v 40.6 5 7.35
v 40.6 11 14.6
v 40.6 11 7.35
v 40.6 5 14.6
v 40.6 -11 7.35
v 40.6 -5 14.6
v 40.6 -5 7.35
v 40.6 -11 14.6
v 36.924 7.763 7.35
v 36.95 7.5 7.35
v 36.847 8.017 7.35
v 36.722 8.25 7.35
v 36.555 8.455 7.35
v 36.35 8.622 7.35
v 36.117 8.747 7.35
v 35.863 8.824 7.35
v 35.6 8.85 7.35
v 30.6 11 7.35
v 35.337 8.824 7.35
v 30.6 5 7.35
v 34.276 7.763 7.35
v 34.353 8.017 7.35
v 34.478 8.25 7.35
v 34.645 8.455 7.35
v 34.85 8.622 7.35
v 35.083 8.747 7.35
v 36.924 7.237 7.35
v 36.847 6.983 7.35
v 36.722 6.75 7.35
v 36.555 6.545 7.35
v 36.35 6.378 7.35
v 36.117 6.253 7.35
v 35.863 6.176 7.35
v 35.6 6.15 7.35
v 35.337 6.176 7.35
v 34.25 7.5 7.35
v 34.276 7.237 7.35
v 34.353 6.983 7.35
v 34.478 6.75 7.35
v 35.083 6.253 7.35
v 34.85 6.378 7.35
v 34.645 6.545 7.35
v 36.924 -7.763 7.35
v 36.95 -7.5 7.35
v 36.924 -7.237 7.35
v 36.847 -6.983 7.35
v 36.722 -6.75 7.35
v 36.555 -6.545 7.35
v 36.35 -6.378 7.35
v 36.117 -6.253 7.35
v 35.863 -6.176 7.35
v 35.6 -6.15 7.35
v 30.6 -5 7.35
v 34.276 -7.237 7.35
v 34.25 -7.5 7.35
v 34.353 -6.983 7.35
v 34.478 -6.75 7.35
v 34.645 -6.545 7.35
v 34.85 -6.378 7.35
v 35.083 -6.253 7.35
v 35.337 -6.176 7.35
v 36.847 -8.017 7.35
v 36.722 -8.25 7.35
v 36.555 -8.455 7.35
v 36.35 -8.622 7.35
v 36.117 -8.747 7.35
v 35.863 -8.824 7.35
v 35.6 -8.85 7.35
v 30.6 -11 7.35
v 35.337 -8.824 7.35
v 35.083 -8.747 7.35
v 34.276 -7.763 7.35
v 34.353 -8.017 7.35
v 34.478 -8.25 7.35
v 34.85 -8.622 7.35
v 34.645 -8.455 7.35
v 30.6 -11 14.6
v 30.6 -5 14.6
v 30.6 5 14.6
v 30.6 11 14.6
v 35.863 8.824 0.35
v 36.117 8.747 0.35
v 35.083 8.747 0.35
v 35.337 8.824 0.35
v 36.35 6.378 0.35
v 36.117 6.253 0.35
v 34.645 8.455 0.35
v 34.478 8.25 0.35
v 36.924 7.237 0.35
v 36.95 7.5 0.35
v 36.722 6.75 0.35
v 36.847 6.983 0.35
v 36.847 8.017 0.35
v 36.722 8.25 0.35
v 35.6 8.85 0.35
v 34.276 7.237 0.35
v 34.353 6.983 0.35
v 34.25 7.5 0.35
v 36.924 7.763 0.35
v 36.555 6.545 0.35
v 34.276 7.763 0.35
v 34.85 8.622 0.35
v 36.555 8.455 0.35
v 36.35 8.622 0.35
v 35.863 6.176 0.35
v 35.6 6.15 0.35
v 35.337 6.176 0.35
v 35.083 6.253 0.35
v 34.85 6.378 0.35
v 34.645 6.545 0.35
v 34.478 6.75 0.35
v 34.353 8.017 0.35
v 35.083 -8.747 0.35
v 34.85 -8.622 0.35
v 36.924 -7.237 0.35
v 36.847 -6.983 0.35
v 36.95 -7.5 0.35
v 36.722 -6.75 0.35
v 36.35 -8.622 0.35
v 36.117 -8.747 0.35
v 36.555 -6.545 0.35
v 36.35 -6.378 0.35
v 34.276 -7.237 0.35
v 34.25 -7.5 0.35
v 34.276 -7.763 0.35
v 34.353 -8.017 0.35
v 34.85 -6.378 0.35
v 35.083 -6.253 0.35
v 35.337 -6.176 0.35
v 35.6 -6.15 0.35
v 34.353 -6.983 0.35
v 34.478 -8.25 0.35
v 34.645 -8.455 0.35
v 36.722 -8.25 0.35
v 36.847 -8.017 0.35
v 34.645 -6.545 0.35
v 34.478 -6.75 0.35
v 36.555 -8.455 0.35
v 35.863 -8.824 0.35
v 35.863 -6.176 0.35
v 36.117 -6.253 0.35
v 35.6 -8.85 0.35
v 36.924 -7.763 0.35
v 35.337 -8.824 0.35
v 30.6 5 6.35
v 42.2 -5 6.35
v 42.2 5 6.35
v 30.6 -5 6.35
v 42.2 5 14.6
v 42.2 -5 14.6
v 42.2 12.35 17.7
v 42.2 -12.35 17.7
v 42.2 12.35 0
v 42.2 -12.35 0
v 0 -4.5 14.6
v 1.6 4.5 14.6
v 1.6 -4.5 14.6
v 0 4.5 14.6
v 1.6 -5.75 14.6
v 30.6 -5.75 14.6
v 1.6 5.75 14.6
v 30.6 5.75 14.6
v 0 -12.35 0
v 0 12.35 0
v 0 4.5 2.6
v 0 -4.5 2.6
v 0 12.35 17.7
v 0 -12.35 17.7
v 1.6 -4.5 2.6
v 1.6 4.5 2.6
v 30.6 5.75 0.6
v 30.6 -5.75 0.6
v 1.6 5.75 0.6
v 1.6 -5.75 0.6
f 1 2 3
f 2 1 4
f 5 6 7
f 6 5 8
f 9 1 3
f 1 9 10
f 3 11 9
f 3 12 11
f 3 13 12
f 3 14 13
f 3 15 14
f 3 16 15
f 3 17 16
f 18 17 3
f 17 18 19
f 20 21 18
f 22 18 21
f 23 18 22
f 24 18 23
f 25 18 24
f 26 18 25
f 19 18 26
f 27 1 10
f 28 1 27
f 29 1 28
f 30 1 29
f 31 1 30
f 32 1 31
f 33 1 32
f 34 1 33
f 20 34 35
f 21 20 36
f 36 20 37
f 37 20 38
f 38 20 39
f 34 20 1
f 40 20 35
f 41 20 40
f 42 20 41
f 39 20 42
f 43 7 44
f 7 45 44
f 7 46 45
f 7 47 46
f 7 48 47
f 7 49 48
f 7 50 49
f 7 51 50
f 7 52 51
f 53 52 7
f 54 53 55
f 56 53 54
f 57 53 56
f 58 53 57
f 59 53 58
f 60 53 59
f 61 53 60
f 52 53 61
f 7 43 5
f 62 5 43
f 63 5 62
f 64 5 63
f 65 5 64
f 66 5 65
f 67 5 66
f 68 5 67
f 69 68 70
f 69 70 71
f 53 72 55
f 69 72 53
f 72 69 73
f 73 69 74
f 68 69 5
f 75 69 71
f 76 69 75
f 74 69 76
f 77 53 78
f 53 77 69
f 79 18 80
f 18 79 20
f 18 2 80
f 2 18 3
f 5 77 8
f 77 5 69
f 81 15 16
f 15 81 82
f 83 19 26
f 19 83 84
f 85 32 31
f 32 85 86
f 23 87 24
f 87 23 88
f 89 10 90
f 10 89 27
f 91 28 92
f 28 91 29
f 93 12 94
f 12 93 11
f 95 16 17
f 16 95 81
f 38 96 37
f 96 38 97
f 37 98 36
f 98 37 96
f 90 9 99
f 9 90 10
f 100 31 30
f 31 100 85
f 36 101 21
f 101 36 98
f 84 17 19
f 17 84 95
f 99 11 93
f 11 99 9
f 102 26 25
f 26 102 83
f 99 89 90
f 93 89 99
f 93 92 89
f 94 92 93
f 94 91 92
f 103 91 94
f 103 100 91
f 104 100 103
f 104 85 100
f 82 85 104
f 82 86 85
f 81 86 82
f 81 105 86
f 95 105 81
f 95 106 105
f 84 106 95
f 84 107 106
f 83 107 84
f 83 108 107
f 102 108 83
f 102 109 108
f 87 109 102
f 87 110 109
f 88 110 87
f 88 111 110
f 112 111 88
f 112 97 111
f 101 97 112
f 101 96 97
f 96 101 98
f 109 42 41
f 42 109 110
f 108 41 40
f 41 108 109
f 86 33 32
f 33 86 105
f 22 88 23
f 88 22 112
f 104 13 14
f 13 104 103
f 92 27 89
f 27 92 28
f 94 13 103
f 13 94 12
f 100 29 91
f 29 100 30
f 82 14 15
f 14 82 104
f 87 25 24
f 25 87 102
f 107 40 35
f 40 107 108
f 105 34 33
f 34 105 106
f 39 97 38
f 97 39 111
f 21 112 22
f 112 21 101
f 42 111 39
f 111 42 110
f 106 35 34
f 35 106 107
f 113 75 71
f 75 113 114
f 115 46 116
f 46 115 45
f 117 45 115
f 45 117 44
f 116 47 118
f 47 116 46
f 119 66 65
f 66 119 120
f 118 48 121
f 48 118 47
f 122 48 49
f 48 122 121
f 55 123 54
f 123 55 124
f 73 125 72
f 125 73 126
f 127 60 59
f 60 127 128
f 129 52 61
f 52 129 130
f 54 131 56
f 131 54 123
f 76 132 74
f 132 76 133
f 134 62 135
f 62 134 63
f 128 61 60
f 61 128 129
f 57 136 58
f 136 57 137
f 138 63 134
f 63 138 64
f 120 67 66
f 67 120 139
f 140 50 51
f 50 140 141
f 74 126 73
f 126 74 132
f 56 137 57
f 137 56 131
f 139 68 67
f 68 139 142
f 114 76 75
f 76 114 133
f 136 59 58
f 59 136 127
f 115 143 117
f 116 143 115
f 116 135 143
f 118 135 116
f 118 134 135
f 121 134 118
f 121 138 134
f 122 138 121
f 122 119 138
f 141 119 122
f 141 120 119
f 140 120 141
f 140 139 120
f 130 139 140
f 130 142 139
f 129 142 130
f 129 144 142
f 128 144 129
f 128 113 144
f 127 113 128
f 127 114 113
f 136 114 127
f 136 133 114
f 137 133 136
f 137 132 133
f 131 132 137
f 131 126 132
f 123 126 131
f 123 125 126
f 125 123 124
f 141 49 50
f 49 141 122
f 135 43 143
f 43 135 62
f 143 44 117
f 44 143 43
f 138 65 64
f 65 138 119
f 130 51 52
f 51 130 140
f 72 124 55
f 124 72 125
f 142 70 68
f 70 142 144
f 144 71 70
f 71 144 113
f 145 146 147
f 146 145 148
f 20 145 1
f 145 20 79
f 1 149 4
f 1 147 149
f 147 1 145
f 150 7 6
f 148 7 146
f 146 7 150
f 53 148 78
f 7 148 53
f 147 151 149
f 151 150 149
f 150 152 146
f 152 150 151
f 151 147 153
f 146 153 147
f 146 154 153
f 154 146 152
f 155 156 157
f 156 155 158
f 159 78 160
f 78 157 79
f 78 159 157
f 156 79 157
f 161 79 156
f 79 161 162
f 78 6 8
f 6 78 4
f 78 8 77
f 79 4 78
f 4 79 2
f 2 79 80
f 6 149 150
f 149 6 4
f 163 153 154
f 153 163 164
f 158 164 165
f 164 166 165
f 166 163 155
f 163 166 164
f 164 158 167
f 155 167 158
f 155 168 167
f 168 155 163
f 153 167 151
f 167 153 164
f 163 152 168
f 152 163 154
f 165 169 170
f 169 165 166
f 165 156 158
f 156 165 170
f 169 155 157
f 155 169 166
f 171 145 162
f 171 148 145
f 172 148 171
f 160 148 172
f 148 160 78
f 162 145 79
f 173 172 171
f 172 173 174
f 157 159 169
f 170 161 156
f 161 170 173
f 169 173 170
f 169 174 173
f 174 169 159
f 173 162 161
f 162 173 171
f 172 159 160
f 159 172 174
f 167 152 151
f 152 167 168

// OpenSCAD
BOARD_DEPTH = 11.5;
BOARD_HEIGHT = 14;
BOARD_WIDTH = 29;

INSERT_HEAD_HEIGHT = 2.5;
INSERT_HEAD_DIAMETER = 5;
INSERT_DIAMETER = 2.7;
INSERT_HEIGHT = 7;

USB_Y_OFFSET = 2;
USB_WIDTH = 9;

USB_FRONT_BLOCK_HEIGHT = 6.25;

CABLE_HEIGHT = 1;
CABLE_WIDTH = 10;
CABLE_STICKOUT = 10;
CABLE_Y_OFFSET = 5.75;

CABLE_REAR_BLOCK_HEIGHT = 5.25;

cable_strap_width = CABLE_WIDTH + INSERT_HEAD_DIAMETER * 2 + 2;
cable_strap_hole_offset_y = CABLE_WIDTH / 2 + INSERT_HEAD_DIAMETER / 2;

WALL_WIDTH = 1.6;
FLOOR_HEIGHT = .6;

render_helper = 1;

total_height = FLOOR_HEIGHT + BOARD_HEIGHT;
total_width = WALL_WIDTH * 2 + BOARD_WIDTH + CABLE_STICKOUT;
total_depth = WALL_WIDTH * 2 + BOARD_DEPTH + INSERT_HEAD_DIAMETER * 2;

module base() {
    translate([0, -total_depth / 2, 0])
    cube([
        total_width,
        total_depth,
        total_height
    ]);
}

module board_cutout() {
    translate([
        WALL_WIDTH,
        -BOARD_DEPTH / 2,
        FLOOR_HEIGHT
    ])
    cube([
        BOARD_WIDTH,
        BOARD_DEPTH,
        BOARD_HEIGHT + render_helper
    ]);
}

module usb_cutout() {
    translate([
        -render_helper,
        -USB_WIDTH / 2,
        USB_Y_OFFSET + FLOOR_HEIGHT
    ])
    cube([
        WALL_WIDTH + render_helper * 2,
        USB_WIDTH,
        BOARD_HEIGHT
    ]);
}

module cable_cutout() {
    union() {
        translate([
            WALL_WIDTH + BOARD_WIDTH - render_helper,
            -CABLE_WIDTH / 2,
            CABLE_Y_OFFSET + FLOOR_HEIGHT
        ])
        cube([
            CABLE_STICKOUT + WALL_WIDTH + render_helper * 2,
            CABLE_WIDTH,
            total_height
        ]);
 
        translate([
            WALL_WIDTH + BOARD_WIDTH,
            0,
            CABLE_Y_OFFSET + CABLE_HEIGHT + FLOOR_HEIGHT
        ])
        union() {
            translate([
                0,
                -cable_strap_width / 2,
                0
            ])
            cube([
                CABLE_STICKOUT,
                cable_strap_width,
                total_height
            ]);
            
            translate([
                CABLE_STICKOUT / 2,
                cable_strap_hole_offset_y,
                -INSERT_HEIGHT
            ])
            cylinder(d = INSERT_DIAMETER, h = INSERT_HEIGHT + render_helper, $fn = 32);
            
            translate([
                CABLE_STICKOUT / 2,
                -cable_strap_hole_offset_y,
                -INSERT_HEIGHT
            ])
            cylinder(d = INSERT_DIAMETER, h = INSERT_HEIGHT + render_helper, $fn = 32);
        }
    }
}

module case_bottom() {
    difference() {
        base();
        usb_cutout();
        board_cutout();
        cable_cutout();
    }
}

module case_top() {
    translate([0, -total_depth / 2, 0])
    cube([total_width, total_depth, FLOOR_HEIGHT + INSERT_HEAD_HEIGHT]);
}

case_bottom();

translate([0, 0, total_height])
case_top();
